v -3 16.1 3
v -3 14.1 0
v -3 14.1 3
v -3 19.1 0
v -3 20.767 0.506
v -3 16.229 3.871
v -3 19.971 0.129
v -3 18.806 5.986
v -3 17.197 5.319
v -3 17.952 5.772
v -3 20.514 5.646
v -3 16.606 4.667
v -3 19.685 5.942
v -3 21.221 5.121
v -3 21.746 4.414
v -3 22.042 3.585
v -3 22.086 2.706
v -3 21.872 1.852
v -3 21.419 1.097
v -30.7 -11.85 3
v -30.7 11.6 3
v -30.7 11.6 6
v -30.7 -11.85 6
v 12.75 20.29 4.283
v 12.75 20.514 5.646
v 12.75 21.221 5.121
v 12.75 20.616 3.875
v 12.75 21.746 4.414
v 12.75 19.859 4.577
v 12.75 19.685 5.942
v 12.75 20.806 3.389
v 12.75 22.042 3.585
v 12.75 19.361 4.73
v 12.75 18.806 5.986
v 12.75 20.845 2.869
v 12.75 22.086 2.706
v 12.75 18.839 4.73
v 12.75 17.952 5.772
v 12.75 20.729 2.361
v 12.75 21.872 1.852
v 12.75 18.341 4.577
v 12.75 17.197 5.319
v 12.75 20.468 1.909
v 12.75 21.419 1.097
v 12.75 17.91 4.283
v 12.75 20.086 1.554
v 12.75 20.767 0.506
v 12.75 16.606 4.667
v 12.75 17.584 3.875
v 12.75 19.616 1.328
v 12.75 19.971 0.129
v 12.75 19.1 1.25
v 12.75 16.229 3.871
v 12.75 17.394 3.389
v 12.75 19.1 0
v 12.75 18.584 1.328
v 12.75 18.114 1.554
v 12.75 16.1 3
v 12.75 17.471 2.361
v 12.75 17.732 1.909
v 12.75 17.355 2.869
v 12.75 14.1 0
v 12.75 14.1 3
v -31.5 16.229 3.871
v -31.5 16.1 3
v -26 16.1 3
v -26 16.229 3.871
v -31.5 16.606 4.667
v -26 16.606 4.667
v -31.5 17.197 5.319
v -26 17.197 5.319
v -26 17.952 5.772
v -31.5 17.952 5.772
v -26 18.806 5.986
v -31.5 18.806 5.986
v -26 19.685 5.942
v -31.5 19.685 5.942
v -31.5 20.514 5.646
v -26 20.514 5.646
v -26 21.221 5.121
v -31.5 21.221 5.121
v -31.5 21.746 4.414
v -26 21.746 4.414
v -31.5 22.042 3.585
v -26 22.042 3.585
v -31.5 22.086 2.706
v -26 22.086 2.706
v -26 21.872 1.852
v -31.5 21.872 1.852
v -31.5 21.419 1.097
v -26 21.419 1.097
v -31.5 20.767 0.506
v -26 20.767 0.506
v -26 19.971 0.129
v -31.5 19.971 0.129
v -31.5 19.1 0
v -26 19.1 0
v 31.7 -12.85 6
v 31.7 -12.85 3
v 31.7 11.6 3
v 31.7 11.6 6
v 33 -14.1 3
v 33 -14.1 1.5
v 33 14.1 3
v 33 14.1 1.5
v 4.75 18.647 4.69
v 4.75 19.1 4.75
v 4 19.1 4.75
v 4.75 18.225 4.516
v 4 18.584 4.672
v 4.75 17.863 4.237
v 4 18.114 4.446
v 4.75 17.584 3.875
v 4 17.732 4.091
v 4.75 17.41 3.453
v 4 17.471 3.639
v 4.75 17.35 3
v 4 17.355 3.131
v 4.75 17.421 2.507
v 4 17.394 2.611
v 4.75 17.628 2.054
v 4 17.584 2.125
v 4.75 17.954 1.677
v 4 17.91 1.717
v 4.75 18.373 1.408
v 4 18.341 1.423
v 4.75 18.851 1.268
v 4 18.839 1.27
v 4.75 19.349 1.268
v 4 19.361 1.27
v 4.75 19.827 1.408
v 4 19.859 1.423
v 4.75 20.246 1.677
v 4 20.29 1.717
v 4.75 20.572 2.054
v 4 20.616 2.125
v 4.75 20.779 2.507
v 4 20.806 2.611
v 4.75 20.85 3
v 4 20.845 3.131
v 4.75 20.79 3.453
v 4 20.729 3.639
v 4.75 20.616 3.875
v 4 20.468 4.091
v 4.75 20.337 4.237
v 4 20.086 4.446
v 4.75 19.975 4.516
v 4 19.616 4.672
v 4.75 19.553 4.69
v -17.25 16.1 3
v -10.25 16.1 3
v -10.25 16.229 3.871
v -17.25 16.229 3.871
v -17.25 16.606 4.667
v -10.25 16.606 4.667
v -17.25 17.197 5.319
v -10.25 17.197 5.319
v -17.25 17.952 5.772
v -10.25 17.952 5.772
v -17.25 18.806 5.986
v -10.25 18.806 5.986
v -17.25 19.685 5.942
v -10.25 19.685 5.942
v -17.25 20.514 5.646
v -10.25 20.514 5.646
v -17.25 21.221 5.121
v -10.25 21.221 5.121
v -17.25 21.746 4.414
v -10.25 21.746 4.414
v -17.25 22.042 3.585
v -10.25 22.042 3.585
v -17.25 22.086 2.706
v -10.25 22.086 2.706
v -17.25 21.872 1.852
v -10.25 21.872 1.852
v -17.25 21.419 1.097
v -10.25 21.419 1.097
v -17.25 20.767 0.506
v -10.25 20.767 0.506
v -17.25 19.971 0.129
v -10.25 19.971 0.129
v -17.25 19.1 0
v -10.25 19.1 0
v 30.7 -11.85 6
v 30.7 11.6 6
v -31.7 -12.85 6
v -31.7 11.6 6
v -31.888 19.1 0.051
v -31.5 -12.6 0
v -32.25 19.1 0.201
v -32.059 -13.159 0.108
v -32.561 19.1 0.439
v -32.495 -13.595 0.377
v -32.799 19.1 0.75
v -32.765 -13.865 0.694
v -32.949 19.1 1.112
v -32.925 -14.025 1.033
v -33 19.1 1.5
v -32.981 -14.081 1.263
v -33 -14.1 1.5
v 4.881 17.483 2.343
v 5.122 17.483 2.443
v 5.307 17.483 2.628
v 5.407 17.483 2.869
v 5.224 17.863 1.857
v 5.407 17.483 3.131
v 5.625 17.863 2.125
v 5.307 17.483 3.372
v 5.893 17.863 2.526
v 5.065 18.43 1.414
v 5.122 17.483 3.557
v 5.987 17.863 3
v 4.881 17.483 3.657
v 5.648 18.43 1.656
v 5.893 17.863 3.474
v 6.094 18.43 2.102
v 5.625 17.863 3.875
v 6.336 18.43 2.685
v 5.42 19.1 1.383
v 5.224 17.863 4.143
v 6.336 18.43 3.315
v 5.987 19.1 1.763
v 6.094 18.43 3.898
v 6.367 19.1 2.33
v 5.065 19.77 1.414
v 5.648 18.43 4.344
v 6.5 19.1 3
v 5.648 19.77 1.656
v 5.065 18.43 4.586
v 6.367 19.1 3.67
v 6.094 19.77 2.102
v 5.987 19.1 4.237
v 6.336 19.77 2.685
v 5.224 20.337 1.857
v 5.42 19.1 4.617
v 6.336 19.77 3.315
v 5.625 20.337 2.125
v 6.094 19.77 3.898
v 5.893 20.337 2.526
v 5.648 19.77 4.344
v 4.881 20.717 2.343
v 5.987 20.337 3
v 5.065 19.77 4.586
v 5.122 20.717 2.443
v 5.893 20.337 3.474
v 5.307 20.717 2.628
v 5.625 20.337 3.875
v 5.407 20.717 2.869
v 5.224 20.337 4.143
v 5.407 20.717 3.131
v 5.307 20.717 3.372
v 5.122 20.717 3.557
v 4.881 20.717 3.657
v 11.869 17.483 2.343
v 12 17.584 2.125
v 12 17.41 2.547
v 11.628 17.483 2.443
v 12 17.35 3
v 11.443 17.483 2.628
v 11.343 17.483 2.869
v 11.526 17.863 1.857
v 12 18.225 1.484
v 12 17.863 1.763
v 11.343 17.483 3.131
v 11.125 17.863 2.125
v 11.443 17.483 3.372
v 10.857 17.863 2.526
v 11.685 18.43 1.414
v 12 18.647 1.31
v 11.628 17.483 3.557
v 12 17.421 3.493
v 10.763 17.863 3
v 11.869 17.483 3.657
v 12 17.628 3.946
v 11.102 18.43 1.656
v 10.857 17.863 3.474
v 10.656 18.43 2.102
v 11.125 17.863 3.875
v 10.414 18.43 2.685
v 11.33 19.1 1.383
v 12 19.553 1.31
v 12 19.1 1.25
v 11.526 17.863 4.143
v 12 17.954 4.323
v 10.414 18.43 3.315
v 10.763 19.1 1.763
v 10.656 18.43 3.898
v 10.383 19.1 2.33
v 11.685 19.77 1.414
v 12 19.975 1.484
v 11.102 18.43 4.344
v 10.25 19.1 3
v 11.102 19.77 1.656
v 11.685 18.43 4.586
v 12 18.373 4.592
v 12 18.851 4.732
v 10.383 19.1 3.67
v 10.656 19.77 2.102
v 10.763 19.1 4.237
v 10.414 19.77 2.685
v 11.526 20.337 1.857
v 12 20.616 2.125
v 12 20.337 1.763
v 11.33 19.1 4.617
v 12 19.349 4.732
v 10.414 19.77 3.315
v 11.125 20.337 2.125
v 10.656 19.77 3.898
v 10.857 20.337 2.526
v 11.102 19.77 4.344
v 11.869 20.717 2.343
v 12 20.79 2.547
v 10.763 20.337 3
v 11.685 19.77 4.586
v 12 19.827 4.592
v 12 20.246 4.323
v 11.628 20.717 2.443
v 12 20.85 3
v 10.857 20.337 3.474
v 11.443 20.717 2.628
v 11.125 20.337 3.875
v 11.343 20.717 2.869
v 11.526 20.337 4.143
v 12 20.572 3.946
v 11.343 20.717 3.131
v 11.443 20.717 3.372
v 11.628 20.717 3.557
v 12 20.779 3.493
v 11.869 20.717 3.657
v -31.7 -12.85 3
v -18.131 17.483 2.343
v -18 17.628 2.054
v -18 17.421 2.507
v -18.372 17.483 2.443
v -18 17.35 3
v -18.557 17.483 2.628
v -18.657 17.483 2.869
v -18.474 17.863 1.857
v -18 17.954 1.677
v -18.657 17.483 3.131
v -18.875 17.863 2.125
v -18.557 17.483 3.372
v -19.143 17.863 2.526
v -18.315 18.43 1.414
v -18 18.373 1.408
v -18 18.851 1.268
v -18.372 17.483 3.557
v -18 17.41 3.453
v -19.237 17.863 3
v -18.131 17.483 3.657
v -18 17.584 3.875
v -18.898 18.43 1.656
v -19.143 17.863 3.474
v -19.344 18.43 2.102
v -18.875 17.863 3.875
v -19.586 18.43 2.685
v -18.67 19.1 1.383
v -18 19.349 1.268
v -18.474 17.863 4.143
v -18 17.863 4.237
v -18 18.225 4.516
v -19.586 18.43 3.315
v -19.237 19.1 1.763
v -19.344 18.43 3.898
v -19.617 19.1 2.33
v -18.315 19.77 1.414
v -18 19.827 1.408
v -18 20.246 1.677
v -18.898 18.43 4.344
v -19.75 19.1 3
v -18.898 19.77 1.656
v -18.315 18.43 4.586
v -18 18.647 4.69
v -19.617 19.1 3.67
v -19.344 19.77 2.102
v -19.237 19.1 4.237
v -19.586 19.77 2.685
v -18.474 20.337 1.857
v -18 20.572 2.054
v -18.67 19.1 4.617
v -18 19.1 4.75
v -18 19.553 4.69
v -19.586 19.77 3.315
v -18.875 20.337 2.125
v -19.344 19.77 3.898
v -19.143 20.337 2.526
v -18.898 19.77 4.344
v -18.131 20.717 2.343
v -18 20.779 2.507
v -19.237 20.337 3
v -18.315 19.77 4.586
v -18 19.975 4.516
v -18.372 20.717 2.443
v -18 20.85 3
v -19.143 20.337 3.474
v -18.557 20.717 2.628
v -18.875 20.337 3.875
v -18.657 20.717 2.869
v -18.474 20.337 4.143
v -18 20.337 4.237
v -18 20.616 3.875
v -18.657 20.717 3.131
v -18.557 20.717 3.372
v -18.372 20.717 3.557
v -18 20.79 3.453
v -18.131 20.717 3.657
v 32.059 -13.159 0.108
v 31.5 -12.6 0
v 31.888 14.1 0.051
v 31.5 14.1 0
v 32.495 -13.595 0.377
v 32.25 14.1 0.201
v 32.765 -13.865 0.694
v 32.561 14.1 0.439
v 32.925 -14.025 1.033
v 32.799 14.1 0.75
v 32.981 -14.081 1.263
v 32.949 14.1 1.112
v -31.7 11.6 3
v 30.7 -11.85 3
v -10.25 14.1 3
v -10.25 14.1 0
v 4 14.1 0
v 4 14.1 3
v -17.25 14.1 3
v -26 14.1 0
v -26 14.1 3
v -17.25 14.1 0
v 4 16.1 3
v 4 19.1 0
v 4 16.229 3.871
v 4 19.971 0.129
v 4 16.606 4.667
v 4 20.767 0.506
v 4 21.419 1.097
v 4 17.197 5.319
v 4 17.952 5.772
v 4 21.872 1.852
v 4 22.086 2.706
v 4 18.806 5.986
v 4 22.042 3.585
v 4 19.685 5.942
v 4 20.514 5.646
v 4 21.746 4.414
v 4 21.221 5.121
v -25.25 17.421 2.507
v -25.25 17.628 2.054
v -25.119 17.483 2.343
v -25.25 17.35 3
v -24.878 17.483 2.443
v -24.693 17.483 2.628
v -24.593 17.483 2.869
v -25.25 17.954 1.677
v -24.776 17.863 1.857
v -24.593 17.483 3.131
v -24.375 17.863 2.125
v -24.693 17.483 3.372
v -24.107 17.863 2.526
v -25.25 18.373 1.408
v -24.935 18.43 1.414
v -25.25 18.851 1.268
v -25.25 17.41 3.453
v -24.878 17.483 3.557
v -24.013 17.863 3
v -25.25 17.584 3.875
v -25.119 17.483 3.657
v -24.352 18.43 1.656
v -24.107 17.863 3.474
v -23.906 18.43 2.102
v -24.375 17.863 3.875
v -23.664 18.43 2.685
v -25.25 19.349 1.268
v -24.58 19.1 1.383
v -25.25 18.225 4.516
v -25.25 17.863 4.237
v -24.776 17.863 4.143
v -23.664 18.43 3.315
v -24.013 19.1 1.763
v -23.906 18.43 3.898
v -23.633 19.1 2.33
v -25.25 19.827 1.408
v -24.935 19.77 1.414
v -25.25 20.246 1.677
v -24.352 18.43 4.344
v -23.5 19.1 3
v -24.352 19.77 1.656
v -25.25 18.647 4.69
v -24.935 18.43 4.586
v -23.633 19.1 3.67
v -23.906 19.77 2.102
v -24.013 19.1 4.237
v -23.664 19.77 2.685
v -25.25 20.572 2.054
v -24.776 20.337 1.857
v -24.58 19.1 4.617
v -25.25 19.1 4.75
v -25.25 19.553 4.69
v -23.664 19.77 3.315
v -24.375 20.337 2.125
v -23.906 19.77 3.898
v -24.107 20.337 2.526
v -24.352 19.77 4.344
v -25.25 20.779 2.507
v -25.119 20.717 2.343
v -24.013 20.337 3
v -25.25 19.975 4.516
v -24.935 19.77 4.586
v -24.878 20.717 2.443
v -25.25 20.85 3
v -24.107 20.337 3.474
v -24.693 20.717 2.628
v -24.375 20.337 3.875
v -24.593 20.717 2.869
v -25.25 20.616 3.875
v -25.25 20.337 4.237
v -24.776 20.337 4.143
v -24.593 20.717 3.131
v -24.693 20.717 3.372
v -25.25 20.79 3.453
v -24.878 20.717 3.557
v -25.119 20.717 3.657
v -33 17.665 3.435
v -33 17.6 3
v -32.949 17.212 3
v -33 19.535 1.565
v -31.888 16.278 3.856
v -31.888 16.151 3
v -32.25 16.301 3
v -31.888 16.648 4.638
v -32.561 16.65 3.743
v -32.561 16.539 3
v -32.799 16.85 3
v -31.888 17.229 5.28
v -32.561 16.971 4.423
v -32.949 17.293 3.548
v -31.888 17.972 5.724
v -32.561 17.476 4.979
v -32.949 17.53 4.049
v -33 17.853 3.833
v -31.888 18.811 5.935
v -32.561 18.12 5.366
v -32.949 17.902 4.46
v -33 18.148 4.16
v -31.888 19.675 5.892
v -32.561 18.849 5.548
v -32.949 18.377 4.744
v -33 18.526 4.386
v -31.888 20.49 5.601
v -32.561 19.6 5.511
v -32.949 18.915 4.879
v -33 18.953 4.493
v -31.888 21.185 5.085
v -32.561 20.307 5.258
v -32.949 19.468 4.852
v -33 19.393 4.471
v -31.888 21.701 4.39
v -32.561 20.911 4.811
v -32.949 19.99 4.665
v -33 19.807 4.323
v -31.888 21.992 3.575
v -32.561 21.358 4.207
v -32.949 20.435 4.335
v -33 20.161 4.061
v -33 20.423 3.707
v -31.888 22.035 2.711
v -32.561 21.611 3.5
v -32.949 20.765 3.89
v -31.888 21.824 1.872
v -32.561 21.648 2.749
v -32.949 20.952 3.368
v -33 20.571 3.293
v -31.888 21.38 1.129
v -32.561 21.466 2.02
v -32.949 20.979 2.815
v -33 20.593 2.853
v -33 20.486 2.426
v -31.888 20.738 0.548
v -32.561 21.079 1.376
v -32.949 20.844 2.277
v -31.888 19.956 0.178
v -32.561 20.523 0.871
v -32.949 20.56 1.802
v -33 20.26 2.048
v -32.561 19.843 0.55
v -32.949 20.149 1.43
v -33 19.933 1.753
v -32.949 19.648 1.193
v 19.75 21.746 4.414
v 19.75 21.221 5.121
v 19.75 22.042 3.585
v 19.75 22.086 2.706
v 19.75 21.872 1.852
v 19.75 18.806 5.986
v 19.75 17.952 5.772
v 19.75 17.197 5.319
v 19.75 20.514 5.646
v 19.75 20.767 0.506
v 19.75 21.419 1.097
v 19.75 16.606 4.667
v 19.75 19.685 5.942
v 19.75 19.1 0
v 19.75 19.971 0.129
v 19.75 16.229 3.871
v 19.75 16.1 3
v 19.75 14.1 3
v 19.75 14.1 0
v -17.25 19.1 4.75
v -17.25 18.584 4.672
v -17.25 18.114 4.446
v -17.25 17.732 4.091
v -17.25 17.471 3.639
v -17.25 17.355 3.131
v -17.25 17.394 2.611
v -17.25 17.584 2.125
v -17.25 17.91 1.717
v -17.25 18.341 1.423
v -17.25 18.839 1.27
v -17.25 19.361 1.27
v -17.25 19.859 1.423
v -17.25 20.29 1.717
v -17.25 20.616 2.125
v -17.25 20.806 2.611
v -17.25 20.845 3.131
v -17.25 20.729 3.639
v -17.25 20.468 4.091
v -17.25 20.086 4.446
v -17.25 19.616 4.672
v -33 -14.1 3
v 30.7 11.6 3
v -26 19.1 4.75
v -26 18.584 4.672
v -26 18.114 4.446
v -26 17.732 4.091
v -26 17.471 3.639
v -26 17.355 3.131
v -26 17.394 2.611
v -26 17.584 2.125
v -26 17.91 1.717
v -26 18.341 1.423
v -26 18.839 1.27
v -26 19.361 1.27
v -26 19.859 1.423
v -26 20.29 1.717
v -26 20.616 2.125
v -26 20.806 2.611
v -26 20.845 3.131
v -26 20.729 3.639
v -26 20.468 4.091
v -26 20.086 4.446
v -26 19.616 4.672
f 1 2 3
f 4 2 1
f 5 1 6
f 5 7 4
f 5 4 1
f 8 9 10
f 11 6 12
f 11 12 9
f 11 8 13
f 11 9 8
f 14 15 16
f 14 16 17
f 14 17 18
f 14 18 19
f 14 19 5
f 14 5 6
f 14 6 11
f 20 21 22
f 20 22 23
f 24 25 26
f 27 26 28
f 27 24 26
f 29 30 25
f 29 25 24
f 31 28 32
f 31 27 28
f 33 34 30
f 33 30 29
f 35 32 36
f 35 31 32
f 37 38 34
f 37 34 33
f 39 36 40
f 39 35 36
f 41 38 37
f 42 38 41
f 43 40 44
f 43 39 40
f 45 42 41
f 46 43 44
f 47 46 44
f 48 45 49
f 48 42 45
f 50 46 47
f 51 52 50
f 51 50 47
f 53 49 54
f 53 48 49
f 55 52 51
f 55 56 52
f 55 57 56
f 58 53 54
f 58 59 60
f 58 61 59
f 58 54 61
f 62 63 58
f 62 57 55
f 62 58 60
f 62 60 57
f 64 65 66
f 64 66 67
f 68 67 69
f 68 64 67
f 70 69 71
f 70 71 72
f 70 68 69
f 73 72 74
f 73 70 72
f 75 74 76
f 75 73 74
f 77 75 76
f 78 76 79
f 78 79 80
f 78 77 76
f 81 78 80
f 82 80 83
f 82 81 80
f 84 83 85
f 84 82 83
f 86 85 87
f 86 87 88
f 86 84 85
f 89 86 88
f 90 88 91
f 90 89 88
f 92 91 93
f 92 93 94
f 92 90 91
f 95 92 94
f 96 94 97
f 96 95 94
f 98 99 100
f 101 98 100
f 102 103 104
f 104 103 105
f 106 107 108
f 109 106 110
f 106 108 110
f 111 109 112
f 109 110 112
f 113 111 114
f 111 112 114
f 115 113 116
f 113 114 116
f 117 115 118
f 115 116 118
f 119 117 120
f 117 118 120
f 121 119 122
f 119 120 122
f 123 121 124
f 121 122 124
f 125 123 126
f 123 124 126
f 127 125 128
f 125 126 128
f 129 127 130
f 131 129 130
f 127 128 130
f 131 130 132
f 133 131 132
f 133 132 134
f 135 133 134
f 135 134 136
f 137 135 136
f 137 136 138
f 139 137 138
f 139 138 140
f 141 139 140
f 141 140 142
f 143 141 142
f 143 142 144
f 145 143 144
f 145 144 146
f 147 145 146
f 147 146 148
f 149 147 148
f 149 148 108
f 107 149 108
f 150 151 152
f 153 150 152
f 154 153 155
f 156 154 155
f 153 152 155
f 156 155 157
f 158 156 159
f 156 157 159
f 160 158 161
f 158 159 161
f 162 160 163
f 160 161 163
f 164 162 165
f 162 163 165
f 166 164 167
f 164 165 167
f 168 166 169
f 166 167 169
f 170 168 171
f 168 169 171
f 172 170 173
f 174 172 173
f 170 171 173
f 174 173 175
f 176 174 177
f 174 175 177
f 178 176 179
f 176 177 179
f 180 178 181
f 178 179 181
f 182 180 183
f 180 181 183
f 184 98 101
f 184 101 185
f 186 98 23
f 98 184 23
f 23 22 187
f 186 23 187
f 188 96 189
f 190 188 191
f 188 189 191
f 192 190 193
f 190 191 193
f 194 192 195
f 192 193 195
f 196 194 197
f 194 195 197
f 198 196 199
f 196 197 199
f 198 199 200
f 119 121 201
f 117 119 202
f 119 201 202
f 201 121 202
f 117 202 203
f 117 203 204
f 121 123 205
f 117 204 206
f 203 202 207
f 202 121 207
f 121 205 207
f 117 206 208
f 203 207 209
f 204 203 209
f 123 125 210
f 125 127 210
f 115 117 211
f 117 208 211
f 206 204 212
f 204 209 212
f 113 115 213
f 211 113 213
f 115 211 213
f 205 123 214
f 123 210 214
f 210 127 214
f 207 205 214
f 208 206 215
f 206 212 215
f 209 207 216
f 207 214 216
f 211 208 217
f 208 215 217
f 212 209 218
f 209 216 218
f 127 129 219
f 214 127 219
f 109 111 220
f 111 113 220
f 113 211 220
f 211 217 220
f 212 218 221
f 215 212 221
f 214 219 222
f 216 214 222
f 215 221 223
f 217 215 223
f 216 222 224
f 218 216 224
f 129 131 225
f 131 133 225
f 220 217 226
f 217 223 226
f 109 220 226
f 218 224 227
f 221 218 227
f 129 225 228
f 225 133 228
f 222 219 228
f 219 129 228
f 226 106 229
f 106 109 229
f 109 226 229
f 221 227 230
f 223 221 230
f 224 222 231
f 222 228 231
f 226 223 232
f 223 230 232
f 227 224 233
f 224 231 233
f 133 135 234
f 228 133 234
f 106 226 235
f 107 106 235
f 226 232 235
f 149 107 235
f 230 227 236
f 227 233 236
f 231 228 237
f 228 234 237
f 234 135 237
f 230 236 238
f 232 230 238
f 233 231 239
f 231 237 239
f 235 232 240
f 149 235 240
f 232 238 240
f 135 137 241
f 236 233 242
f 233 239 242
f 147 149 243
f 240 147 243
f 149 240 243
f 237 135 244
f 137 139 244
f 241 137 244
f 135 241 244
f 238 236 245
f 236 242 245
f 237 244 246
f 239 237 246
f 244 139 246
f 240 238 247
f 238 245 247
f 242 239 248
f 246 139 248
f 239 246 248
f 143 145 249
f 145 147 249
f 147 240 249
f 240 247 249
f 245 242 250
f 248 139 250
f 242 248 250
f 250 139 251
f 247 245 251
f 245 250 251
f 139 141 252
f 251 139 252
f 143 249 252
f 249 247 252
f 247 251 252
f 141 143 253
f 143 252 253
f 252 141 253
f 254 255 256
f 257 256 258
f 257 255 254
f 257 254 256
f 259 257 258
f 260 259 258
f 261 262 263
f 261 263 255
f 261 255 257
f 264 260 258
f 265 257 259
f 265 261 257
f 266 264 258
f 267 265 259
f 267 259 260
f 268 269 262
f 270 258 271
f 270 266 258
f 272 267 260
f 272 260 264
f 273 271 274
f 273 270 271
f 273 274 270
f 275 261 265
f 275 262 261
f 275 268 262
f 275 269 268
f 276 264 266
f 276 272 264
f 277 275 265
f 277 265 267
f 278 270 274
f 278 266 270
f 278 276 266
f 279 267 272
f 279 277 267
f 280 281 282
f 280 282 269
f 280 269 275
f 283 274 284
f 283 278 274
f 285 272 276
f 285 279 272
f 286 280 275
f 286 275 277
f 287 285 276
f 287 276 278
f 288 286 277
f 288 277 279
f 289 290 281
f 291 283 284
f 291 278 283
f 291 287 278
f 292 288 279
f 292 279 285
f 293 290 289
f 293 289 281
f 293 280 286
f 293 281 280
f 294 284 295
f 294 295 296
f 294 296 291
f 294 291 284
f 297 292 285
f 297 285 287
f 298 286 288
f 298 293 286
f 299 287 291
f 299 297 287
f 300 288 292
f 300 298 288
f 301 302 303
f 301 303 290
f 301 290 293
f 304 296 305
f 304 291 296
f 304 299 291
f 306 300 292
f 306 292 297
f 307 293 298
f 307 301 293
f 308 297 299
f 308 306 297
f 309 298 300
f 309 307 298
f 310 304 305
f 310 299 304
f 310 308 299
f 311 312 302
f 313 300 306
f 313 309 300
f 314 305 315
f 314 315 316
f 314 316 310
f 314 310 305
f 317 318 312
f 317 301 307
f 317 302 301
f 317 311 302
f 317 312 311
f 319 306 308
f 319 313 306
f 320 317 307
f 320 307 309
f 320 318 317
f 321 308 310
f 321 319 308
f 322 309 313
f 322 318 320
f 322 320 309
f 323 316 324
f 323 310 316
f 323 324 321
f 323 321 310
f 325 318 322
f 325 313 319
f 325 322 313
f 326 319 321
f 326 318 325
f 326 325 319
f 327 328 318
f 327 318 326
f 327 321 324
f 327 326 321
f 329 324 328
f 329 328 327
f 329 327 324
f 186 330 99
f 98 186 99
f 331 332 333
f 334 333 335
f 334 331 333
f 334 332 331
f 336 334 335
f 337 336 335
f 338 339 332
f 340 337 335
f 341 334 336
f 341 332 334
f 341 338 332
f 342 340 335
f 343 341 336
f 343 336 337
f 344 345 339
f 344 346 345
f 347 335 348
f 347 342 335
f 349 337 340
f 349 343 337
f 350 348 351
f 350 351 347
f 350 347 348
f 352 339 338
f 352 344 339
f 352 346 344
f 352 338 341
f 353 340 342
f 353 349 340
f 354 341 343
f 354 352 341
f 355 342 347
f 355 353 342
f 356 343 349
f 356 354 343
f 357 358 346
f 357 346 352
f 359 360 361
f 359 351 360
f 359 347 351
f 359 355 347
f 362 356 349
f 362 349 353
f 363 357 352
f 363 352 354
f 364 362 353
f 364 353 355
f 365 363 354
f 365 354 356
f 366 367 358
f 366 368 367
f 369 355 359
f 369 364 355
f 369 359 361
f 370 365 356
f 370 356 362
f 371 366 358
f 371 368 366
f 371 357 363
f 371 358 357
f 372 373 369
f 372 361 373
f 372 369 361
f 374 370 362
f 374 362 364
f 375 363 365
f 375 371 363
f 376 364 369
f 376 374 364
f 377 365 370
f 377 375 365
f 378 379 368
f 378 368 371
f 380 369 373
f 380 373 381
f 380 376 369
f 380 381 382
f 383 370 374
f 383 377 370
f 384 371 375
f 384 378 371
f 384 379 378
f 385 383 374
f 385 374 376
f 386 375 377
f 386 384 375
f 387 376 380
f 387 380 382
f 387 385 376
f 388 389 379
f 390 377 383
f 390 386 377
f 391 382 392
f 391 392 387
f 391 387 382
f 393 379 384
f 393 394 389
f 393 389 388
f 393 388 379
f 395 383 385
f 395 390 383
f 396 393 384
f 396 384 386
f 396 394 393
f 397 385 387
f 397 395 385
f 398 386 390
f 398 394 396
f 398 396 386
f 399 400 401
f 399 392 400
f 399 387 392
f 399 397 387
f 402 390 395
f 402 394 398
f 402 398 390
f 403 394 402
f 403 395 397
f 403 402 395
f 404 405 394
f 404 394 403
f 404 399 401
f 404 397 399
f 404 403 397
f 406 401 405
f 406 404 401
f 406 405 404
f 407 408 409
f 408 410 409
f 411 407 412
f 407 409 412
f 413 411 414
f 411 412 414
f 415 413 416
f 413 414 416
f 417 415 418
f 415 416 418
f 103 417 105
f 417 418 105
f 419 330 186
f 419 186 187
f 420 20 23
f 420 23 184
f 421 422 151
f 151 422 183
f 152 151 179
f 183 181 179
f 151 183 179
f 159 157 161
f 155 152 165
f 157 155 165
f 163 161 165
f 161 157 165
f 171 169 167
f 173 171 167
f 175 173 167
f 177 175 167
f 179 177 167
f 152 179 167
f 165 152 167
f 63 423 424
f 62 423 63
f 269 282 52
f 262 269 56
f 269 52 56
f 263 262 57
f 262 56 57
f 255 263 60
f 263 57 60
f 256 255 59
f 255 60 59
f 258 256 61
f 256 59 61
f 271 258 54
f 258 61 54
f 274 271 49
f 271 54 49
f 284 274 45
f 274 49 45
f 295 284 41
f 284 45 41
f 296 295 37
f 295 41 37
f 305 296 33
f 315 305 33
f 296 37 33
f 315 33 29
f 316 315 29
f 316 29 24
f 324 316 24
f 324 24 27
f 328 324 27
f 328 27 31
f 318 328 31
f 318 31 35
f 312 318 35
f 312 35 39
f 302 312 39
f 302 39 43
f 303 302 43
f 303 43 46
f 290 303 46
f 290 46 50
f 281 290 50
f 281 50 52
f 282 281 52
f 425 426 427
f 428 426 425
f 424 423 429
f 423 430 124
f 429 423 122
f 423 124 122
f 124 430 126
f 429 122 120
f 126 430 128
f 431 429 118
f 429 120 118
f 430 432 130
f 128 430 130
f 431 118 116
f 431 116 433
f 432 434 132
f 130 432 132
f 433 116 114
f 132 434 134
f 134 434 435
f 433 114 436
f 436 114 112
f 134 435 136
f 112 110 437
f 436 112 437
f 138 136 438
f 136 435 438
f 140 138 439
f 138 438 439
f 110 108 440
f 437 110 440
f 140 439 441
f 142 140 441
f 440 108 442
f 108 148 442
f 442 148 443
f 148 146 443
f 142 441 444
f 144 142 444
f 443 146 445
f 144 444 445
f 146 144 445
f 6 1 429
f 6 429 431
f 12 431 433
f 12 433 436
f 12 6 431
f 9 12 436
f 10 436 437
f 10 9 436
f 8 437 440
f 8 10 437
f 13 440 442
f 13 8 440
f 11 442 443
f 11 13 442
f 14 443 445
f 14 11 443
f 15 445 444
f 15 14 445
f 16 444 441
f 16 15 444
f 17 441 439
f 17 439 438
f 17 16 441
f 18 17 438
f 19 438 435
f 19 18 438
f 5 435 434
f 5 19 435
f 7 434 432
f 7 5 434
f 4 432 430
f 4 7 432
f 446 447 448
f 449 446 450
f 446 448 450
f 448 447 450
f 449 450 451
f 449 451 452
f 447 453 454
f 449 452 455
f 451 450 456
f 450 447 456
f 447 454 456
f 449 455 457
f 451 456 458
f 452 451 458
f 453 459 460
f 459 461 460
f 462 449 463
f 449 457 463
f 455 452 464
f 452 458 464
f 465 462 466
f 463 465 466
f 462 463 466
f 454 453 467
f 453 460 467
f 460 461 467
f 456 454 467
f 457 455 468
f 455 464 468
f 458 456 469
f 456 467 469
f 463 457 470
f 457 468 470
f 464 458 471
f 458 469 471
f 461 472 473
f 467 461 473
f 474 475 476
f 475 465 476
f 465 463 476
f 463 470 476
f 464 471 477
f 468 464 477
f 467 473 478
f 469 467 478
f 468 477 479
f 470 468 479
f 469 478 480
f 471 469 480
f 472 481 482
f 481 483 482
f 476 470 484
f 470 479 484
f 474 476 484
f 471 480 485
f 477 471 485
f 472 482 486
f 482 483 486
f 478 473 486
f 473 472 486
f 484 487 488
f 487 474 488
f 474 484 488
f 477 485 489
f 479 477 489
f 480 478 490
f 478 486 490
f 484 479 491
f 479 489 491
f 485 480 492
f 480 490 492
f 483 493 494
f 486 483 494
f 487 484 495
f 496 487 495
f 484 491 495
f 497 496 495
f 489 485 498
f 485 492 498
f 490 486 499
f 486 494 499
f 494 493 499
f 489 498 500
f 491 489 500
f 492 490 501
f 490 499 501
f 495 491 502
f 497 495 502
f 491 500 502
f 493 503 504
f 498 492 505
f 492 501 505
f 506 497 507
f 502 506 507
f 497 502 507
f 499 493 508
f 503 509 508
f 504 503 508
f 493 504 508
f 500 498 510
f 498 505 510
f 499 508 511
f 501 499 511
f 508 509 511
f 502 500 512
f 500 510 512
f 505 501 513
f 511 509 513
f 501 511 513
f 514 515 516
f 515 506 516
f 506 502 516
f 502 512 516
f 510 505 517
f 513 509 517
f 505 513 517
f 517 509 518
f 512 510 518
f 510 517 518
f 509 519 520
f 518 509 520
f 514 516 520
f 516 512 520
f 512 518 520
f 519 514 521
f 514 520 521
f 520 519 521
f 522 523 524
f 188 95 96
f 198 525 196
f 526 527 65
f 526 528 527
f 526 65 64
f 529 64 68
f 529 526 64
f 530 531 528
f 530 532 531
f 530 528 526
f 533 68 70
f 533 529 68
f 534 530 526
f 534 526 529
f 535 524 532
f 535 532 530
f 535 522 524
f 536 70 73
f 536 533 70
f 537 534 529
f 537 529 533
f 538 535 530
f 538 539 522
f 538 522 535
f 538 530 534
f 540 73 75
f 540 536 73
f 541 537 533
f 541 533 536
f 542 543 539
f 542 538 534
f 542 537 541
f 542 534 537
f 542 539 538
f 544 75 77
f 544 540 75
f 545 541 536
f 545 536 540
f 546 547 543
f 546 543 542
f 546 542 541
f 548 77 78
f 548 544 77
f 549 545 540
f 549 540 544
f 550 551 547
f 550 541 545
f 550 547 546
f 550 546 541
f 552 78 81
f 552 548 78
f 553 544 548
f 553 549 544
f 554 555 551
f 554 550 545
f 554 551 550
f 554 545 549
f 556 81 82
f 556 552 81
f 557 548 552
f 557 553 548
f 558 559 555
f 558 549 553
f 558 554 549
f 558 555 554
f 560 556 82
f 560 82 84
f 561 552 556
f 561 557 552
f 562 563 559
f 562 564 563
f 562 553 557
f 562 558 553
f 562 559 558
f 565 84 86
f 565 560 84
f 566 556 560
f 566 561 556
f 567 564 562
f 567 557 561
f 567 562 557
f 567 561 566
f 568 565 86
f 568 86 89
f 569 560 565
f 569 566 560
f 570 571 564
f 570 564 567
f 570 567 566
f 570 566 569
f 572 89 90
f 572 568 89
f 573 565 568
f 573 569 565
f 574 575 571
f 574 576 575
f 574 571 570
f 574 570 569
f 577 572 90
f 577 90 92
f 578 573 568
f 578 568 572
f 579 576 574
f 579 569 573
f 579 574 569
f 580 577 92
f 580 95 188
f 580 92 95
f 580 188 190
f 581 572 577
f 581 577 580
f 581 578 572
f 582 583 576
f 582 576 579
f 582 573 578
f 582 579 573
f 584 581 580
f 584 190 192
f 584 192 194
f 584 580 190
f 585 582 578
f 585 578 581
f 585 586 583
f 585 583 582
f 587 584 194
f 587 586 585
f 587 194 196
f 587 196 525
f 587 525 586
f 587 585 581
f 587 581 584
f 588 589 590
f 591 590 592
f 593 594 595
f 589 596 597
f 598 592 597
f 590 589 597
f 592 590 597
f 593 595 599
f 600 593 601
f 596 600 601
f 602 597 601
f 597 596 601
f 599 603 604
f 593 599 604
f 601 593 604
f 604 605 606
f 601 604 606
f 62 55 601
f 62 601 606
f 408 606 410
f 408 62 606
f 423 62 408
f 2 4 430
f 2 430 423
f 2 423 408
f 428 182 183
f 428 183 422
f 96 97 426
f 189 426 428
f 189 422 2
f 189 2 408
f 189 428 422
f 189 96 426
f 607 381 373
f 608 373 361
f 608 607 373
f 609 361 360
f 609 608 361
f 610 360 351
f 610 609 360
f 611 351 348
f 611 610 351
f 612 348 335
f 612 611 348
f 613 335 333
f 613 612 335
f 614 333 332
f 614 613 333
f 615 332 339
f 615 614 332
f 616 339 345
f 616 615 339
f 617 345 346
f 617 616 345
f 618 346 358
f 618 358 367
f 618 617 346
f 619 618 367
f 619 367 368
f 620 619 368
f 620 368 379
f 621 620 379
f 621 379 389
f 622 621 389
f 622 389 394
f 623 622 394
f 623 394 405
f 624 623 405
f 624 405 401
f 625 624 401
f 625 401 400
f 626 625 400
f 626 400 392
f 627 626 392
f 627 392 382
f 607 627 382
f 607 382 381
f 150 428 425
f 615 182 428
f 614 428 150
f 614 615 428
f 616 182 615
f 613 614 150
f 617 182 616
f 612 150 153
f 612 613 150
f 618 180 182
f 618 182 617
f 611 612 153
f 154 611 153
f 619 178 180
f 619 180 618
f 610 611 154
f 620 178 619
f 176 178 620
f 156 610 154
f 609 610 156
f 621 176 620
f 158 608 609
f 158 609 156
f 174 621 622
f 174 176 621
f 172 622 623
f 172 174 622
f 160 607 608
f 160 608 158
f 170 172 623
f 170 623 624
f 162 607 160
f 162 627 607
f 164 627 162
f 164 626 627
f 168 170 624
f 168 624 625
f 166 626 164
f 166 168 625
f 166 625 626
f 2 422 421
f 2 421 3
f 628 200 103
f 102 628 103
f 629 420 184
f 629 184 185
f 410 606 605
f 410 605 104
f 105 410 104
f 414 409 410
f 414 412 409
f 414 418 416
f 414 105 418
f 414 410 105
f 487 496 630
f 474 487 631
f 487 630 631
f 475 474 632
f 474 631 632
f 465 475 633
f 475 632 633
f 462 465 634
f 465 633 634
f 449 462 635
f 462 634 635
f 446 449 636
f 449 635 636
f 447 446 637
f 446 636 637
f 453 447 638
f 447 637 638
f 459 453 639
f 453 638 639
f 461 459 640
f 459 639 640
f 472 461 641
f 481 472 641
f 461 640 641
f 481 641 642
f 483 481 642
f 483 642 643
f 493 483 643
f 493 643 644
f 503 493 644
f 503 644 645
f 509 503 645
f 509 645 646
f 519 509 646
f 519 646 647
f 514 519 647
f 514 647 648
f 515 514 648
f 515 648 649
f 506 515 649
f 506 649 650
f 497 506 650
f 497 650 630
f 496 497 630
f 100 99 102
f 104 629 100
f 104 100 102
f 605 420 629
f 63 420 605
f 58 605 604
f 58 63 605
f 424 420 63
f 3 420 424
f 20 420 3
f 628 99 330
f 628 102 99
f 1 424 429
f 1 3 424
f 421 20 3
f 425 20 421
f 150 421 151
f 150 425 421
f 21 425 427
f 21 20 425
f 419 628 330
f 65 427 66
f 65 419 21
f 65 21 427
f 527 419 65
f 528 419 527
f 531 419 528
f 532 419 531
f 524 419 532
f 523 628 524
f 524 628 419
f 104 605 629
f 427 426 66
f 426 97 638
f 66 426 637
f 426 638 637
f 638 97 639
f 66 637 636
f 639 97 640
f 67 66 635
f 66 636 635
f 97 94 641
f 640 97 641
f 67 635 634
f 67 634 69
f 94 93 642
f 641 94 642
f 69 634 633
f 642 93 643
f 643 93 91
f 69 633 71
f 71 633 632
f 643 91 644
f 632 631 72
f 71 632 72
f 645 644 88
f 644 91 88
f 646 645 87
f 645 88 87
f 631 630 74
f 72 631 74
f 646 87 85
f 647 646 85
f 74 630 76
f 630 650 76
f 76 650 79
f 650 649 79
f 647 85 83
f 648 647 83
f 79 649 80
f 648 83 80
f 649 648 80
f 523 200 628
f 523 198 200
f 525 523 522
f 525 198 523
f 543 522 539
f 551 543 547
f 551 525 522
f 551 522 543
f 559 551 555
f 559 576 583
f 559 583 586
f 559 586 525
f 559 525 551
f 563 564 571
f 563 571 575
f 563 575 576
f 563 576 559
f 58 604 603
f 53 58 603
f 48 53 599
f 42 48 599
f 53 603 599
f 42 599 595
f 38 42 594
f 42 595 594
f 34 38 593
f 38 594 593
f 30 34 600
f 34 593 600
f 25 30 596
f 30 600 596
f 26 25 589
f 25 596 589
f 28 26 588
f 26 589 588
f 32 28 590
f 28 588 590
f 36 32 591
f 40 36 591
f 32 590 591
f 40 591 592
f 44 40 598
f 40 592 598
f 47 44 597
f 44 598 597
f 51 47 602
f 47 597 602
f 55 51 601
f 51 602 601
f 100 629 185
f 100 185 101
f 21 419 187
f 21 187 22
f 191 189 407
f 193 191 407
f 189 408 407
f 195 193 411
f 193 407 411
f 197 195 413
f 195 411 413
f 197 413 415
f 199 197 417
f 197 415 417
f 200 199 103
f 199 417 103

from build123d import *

# Parameters (mm, degrees)
SKETCH1_W                 = 66
SKETCH1_H                 = 28.2
BOSS_EXTRUDE1_DEPTH       = 3
BOSS_EXTRUDE4_DEPTH       = 7
SKETCH17_R                = 1.75
BOSS_EXTRUDE7_DEPTH       = 0.75
REVOLVE4_ANGLE            = 180
LPATTERN2_COUNT           = 2
LPATTERN2_PITCH           = 30
LPATTERN2_COPY_1_DEPTH    = 7
LPATTERN2_COPY_2_SKETCH_R = 1.75
LPATTERN2_COPY_2_DEPTH    = 0.75
LPATTERN2_COPY_3_ANGLE    = 180
FILLET5_R                 = 1.5
BOSS_EXTRUDE3_DEPTH       = 3


with BuildPart() as part:
    # Sketch1 → Boss-Extrude1 (new body)
    with BuildSketch(Plane.XY):
        Rectangle(SKETCH1_W, SKETCH1_H)
    extrude(amount=BOSS_EXTRUDE1_DEPTH)

    # Sketch10 → Boss-Extrude4 (add)
    with BuildSketch(Plane.ZY.offset(33)):
        with BuildLine():
            Line((0, 19.1), (0, 14.1))
            Line((0, 14.1), (3, 14.1))
            Line((3, 14.1), (3, 16.1))
            ThreePointArc((3, 16.1), (5.121320344, 21.221320344), (0, 19.1))
        make_face()
    boss_extrude4 = extrude(amount=-BOSS_EXTRUDE4_DEPTH)

    # Sketch17 → Boss-Extrude7 (add)
    with BuildSketch(Plane(origin=(-26, 0, 0), x_dir=(0, 0, -1), z_dir=(1, 0, 0))):
        with Locations(Location((-3, 19.1, 0), (0, 0, 180))):
            Circle(SKETCH17_R)
    boss_extrude7 = extrude(amount=BOSS_EXTRUDE7_DEPTH)

    # Sketch18 → Revolve4 (revolve)
    with BuildSketch(Plane(origin=(-25.25, 0, 0), x_dir=(0, 0, -1), z_dir=(1, 0, 0))):
        with BuildLine():
            Line((-3, 20.85), (-3, 17.35))
            ThreePointArc((-3, 17.35), (-1.25, 19.1), (-3, 20.85))
        make_face()
    revolve4 = revolve(axis=Axis((-25.25, 20.85, 3), (0, -1, 0)), revolution_arc=REVOLVE4_ANGLE)

    # Mirror1: Boss-Extrude4, Boss-Extrude7, Revolve4 across plane
    add(boss_extrude4.mirror(Plane(origin=(-21.625, 0, 0), x_dir=(0, 0, 1), z_dir=(1, 0, 0))))
    add(boss_extrude7.mirror(Plane(origin=(-21.625, 0, 0), x_dir=(0, 0, 1), z_dir=(1, 0, 0))))
    add(revolve4.mirror(Plane(origin=(-21.625, 0, 0), x_dir=(0, 0, 1), z_dir=(1, 0, 0))))

    # LPattern2: Boss-Extrude4, Boss-Extrude7, Revolve4 ×2
    with Locations(*[(i * LPATTERN2_PITCH, 0, 0) for i in range(1, LPATTERN2_COUNT)]):
        add(boss_extrude4)
        add(boss_extrude7)
        add(revolve4)

    # LPattern2 copy 1 sketch → LPattern2 copy 1 (add)
    with BuildSketch(Plane(origin=(19.75, 0, 0), x_dir=(0, 0, 1), z_dir=(1, 0, 0))):
        with BuildLine():
            Line((0, -19.1), (0, -14.1))
            Line((0, -14.1), (3, -14.1))
            Line((3, -14.1), (3, -16.1))
            ThreePointArc((3, -16.1), (5.121320344, -21.221320344), (0, -19.1))
        make_face()
    extrude(amount=-LPATTERN2_COPY_1_DEPTH)

    # LPattern2 copy 2 sketch → LPattern2 copy 2 (add)
    with BuildSketch(Plane(origin=(12.75, 0, 0), x_dir=(0, 0, -1), z_dir=(-1, 0, 0))):
        with Locations((-3, -19.1)):
            Circle(LPATTERN2_COPY_2_SKETCH_R)
    extrude(amount=LPATTERN2_COPY_2_DEPTH)

    # LPattern2 copy 3 sketch → LPattern2 copy 3 (revolve)
    with BuildSketch(Plane(origin=(12, 0, 0), x_dir=(0, 0, -1), z_dir=(-1, 0, 0))):
        with BuildLine():
            Line((-3, -20.85), (-3, -17.35))
            ThreePointArc((-3, -17.35), (-1.25, -19.1), (-3, -20.85))
        make_face()
    revolve(axis=Axis((12, 20.85, 3), (0, 1, 0)), revolution_arc=LPATTERN2_COPY_3_ANGLE)

    # Fillet5
    fillet5_edges = [part.edges().sort_by_distance(p)[0] for p in [
        (-33, 21.221320344, 5.121320344),
        (0, -14.1, 0),
        (-33, 2.5, 0),
        (33, 0, 0),
    ]]
    fillet(fillet5_edges, radius=FILLET5_R)

    # Sketch9 → Boss-Extrude3 (add)
    with BuildSketch(Plane.XY.offset(3)):
        Polygon((-31.7, 11.6), (-30.7, 11.6), (-30.7, -11.85), (30.7, -11.85), (30.7, 11.6), (31.7, 11.6), (31.7, -11.85), (31.7, -12.85), (-30.7, -12.85), (-31.7, -12.85), align=None)
    extrude(amount=BOSS_EXTRUDE3_DEPTH)


solid = part.part
